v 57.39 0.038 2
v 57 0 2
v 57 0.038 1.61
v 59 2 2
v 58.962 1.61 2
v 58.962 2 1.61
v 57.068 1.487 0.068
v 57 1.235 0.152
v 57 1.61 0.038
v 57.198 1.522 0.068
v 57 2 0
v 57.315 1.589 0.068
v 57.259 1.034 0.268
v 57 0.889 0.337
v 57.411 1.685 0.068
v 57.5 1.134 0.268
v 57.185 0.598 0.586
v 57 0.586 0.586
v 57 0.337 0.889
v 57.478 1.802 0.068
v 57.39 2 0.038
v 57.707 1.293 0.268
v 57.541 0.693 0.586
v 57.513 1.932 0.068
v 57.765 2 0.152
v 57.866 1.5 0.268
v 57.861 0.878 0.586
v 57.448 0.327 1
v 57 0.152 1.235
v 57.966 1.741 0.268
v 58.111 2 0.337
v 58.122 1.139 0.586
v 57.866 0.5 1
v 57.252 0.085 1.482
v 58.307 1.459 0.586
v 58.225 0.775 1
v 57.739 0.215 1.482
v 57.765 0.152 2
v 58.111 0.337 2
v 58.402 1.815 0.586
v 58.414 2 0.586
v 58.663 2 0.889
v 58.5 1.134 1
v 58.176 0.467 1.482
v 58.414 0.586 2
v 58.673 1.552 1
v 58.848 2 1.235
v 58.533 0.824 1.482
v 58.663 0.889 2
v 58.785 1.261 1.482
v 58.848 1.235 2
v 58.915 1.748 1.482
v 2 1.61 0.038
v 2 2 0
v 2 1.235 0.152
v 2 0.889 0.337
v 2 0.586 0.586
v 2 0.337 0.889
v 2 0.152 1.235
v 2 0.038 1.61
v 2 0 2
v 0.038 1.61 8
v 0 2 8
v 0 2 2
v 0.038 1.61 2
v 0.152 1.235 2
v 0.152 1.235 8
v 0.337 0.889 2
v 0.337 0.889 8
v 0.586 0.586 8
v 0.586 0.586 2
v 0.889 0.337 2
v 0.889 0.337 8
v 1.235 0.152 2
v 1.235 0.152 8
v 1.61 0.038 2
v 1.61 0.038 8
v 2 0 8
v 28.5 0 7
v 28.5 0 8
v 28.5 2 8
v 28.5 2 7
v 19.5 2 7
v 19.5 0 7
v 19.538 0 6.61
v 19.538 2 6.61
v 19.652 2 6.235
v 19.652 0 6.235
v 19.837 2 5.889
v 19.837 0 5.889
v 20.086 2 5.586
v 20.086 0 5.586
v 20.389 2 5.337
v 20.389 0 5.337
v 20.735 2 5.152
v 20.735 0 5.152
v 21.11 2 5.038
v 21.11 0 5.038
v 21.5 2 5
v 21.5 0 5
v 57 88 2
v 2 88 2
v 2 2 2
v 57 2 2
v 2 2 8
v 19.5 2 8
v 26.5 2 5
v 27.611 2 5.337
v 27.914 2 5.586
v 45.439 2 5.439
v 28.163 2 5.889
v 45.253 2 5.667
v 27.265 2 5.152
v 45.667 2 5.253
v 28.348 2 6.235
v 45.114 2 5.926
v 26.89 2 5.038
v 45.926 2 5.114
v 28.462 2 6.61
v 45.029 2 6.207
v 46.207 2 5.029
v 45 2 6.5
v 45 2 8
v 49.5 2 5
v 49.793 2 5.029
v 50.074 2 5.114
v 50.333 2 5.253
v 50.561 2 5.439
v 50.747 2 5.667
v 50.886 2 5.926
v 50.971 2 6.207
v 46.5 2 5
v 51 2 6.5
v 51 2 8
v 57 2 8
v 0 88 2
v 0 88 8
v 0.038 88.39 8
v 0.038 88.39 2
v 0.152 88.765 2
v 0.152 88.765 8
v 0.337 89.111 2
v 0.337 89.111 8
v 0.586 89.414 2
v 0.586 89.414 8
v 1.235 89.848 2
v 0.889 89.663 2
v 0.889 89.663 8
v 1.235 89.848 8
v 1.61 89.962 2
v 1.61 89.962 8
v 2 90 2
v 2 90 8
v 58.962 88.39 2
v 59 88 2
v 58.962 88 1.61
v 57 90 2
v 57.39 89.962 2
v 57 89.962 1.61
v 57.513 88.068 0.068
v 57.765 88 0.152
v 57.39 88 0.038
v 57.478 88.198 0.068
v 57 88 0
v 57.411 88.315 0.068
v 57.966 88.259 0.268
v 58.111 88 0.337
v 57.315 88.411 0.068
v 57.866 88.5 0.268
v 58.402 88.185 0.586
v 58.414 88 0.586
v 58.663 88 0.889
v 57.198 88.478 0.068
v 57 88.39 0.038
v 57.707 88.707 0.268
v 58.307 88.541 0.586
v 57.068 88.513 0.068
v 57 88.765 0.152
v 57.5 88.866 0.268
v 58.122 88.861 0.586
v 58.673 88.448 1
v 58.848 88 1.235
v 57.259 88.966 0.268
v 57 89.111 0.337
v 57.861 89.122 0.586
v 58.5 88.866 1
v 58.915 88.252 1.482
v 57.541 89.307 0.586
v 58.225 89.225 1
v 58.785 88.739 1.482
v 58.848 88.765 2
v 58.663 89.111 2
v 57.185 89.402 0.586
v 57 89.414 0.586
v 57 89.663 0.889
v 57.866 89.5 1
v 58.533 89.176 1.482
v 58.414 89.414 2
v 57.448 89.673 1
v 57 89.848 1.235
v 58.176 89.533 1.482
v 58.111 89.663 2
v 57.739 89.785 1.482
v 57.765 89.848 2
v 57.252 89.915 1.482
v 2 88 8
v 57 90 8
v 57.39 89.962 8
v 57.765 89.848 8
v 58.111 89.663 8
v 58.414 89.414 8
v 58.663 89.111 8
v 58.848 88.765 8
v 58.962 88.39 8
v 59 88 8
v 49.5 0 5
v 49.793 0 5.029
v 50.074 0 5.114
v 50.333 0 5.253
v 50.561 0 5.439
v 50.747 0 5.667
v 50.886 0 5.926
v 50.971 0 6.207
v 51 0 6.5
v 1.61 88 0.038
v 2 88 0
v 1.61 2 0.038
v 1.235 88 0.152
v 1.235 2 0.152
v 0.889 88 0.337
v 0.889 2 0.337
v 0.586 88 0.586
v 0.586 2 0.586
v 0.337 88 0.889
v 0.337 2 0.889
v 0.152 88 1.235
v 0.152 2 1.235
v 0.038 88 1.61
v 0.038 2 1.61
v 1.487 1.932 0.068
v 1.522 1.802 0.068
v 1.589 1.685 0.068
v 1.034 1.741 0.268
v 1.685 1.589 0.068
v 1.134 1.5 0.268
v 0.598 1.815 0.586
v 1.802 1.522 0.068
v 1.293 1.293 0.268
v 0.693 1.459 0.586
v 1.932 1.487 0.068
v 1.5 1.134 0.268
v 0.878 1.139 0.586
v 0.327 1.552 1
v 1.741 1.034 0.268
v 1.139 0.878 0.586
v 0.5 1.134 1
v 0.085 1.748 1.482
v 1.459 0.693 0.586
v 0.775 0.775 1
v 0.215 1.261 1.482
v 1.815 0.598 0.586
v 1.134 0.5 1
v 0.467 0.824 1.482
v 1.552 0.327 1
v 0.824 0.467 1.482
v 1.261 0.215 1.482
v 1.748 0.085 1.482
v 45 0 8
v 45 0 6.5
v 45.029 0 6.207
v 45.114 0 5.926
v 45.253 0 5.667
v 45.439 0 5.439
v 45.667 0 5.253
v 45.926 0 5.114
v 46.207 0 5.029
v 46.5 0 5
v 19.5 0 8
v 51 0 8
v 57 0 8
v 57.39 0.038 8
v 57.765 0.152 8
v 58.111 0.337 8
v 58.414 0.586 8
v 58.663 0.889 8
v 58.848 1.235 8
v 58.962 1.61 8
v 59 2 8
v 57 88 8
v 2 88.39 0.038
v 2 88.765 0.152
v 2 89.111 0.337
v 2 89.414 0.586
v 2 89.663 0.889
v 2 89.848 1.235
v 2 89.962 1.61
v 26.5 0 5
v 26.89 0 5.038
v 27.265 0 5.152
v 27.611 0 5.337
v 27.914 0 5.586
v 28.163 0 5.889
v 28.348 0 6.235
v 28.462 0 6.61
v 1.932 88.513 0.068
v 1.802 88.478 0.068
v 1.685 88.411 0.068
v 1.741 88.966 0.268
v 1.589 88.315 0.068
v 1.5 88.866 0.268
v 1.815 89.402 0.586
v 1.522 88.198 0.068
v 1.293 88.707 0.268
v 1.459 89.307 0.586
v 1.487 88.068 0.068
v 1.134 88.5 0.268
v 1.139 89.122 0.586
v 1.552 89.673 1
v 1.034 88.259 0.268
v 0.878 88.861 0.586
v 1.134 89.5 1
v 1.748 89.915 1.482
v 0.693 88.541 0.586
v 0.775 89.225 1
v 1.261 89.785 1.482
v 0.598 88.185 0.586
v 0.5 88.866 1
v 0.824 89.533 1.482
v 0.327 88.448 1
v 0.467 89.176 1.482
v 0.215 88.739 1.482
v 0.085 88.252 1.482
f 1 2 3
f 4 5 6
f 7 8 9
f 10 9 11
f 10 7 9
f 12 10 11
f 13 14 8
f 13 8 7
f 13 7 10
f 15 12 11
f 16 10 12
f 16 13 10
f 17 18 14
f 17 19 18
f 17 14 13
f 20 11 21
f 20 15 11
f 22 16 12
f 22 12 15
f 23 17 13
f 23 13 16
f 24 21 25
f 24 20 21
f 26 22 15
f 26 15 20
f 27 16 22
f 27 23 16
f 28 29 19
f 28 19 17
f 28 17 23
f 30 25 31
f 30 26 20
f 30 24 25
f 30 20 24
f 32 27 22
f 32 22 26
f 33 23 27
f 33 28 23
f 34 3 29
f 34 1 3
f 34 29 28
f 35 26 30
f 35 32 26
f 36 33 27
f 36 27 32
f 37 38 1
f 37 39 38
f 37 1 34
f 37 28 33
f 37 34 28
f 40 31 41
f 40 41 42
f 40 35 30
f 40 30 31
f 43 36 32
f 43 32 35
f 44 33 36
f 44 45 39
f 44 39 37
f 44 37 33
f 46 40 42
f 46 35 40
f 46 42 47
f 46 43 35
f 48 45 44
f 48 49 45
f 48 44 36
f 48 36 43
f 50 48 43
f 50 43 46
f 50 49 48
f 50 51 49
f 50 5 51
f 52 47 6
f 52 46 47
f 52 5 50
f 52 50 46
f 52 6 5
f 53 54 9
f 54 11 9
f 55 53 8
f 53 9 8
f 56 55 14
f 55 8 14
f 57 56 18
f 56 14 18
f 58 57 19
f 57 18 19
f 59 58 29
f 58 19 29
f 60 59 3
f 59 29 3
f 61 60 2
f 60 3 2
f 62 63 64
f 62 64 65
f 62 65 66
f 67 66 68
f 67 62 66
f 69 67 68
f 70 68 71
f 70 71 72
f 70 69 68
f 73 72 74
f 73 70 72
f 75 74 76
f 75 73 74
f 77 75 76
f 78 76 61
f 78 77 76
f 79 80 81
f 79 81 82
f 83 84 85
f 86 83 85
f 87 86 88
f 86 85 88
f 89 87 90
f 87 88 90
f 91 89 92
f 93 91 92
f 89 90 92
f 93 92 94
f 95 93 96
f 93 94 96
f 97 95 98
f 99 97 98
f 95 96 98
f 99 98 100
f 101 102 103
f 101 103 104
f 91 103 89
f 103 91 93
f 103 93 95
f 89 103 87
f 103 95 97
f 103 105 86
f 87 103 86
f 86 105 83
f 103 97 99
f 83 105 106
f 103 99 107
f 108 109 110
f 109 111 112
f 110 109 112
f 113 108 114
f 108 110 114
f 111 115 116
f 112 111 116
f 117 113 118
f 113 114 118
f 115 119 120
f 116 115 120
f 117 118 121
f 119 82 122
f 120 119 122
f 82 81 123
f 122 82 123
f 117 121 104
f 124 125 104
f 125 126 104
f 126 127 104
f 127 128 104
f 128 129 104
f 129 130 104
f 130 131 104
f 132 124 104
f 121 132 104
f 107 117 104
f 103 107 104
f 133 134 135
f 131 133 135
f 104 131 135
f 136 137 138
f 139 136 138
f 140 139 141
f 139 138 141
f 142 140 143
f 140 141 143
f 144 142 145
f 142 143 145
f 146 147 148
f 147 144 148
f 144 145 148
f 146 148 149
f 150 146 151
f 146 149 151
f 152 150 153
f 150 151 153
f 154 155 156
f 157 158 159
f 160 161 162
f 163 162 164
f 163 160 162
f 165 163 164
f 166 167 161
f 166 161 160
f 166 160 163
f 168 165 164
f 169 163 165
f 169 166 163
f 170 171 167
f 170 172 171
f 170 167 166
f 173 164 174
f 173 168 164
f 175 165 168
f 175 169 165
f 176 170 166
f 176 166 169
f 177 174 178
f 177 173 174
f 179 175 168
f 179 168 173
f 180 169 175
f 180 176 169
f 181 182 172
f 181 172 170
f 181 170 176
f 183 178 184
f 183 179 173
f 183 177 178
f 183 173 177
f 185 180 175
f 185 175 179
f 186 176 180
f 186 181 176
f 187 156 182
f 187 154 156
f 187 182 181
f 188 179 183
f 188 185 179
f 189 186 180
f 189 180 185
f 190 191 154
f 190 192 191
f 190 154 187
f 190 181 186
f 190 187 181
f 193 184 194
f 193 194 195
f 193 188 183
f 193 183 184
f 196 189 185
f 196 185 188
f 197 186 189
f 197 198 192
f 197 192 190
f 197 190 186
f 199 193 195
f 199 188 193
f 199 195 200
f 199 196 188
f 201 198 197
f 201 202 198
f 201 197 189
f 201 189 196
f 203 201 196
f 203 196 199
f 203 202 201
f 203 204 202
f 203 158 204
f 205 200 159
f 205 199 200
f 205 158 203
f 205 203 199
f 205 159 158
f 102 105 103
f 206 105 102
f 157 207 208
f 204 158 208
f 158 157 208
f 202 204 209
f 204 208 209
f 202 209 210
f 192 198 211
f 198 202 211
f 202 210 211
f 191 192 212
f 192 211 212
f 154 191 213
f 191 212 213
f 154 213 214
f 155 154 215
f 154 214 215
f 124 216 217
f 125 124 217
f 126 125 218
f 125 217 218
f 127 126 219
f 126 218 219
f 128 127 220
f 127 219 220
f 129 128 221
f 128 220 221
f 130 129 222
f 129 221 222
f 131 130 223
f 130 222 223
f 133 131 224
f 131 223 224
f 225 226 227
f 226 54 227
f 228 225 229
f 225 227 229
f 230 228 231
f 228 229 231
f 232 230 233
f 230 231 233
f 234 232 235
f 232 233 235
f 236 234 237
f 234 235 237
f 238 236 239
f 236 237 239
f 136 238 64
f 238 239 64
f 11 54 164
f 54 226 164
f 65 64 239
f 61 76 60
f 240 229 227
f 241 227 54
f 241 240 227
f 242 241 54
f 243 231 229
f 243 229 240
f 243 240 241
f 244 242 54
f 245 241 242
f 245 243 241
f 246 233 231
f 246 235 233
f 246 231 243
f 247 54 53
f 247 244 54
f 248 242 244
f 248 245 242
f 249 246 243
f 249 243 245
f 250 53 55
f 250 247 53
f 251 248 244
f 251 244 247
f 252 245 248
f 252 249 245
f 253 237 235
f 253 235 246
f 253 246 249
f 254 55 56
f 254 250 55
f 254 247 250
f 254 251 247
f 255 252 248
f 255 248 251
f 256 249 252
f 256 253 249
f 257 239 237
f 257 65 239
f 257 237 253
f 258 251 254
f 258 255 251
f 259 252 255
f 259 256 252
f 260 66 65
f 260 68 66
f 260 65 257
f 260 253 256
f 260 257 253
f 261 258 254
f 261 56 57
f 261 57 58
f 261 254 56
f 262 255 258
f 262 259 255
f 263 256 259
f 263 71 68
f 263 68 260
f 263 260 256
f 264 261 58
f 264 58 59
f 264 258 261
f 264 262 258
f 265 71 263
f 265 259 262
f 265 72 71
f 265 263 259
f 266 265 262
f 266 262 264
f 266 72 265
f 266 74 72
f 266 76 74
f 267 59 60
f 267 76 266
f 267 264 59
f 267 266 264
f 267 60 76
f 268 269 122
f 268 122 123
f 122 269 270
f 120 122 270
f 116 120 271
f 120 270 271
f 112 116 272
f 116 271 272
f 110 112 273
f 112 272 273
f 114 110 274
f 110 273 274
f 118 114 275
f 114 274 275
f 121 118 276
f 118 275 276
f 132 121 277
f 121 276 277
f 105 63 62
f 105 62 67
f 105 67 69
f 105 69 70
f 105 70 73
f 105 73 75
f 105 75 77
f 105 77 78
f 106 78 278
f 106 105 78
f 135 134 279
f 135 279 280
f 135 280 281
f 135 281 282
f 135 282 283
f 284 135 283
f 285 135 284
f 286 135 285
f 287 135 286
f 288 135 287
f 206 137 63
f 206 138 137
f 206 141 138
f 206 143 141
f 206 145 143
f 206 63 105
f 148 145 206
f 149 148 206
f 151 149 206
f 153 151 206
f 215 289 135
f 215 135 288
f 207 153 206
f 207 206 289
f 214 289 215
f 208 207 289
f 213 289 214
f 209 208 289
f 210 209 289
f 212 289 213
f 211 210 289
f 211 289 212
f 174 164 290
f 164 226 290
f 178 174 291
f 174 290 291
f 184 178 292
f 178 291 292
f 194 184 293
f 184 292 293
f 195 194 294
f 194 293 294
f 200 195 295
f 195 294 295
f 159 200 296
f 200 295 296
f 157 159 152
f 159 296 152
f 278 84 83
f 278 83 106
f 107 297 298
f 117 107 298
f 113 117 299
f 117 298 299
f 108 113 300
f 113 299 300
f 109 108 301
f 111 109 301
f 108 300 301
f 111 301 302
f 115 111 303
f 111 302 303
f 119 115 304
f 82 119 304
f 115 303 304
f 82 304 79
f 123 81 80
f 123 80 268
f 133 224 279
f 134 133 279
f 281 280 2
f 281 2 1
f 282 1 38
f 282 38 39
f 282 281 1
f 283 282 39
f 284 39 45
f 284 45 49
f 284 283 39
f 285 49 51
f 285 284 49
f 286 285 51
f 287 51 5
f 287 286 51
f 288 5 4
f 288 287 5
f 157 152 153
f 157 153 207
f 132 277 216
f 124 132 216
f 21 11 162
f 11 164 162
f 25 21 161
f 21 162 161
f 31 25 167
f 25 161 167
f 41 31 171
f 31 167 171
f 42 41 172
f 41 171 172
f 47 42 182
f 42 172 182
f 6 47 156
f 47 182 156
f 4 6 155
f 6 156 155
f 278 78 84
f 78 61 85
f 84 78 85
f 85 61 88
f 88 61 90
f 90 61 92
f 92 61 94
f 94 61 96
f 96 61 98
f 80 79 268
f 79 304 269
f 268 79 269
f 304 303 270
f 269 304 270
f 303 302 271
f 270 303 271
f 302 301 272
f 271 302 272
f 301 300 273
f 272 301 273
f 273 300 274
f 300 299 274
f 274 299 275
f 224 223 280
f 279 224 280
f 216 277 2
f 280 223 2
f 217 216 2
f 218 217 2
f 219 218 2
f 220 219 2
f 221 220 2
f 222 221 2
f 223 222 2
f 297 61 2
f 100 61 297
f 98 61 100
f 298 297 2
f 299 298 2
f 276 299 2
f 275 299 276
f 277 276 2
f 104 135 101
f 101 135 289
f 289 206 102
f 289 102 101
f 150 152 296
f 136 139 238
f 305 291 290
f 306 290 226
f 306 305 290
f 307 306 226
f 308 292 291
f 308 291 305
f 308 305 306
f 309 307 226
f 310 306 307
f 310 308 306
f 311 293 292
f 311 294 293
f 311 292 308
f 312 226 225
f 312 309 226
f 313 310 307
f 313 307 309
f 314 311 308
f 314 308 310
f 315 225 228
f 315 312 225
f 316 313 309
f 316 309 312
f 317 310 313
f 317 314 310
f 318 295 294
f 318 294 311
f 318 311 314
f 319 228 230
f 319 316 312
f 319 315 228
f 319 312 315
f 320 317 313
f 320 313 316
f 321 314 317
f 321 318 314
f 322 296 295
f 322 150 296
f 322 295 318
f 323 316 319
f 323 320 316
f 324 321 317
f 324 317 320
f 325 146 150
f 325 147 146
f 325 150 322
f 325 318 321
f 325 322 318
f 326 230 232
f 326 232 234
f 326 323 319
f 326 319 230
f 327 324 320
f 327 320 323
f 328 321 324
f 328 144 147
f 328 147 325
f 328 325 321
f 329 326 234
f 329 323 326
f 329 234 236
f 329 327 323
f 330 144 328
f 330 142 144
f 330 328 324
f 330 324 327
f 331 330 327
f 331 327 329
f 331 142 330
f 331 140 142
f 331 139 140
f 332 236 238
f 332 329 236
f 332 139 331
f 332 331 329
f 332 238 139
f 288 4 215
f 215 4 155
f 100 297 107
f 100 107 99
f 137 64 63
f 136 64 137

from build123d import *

# Parameters (mm, degrees)
BOX_W           = 59
BOX_H           = 90
BOX_DEPTH       = 8
SKETCH_W        = 55
SKETCH_H        = 86
POCKET_DEPTH    = 6
POCKET001_DEPTH = 2
FILLET_R        = 2
FILLET002_R     = 2


with BuildPart() as part:
    # Box → Box (join)
    with BuildSketch(Plane.XY):
        with Locations((29.5, 45)):
            Rectangle(BOX_W, BOX_H)
    extrude(amount=BOX_DEPTH)

    # Sketch (on Face6 of Box) → Pocket (cut)
    with BuildSketch(Plane.XY.offset(8)):
        with Locations((29.5, 45)):
            Rectangle(SKETCH_W, SKETCH_H)
    extrude(amount=-POCKET_DEPTH, mode=Mode.SUBTRACT)

    # Sketch001 (on Face2 of Pocket) → Pocket001 (cut)
    with BuildSketch(Plane.XZ):
        with BuildLine():
            Line((28.5, 8), (28.5, 7))
            ThreePointArc((26.5, 5), (27.914214, 5.585786), (28.5, 7))
            Line((26.5, 5), (21.5, 5))
            ThreePointArc((19.5, 7), (20.085786, 5.585786), (21.5, 5))
            Line((19.5, 7), (19.5, 8))
            Line((19.5, 8), (28.5, 8))
        make_face()
        with BuildLine():
            ThreePointArc((45, 6.5), (45.43934, 5.43934), (46.5, 5))
            Line((46.5, 5), (49.5, 5))
            ThreePointArc((49.5, 5), (50.56066, 5.43934), (51, 6.5))
            Line((51, 6.5), (51, 8))
            Line((45, 8), (51, 8))
            Line((45, 6.5), (45, 8))
        make_face()
    extrude(amount=-POCKET001_DEPTH, mode=Mode.SUBTRACT)

    # Fillet
    fillet_edges = [part.edges().sort_by_distance(p)[0] for p in [
        (59, 90, 4),
        (0, 90, 4),
        (0, 0, 4),
        (59, 0, 4),
    ]]
    fillet(fillet_edges, radius=FILLET_R)

    # Fillet002
    fillet002_edges = [part.edges().sort_by_distance(p)[0] for p in [
        (29.5, 0, 0),
    ]]
    fillet(fillet002_edges, radius=FILLET002_R)


solid = part.part
